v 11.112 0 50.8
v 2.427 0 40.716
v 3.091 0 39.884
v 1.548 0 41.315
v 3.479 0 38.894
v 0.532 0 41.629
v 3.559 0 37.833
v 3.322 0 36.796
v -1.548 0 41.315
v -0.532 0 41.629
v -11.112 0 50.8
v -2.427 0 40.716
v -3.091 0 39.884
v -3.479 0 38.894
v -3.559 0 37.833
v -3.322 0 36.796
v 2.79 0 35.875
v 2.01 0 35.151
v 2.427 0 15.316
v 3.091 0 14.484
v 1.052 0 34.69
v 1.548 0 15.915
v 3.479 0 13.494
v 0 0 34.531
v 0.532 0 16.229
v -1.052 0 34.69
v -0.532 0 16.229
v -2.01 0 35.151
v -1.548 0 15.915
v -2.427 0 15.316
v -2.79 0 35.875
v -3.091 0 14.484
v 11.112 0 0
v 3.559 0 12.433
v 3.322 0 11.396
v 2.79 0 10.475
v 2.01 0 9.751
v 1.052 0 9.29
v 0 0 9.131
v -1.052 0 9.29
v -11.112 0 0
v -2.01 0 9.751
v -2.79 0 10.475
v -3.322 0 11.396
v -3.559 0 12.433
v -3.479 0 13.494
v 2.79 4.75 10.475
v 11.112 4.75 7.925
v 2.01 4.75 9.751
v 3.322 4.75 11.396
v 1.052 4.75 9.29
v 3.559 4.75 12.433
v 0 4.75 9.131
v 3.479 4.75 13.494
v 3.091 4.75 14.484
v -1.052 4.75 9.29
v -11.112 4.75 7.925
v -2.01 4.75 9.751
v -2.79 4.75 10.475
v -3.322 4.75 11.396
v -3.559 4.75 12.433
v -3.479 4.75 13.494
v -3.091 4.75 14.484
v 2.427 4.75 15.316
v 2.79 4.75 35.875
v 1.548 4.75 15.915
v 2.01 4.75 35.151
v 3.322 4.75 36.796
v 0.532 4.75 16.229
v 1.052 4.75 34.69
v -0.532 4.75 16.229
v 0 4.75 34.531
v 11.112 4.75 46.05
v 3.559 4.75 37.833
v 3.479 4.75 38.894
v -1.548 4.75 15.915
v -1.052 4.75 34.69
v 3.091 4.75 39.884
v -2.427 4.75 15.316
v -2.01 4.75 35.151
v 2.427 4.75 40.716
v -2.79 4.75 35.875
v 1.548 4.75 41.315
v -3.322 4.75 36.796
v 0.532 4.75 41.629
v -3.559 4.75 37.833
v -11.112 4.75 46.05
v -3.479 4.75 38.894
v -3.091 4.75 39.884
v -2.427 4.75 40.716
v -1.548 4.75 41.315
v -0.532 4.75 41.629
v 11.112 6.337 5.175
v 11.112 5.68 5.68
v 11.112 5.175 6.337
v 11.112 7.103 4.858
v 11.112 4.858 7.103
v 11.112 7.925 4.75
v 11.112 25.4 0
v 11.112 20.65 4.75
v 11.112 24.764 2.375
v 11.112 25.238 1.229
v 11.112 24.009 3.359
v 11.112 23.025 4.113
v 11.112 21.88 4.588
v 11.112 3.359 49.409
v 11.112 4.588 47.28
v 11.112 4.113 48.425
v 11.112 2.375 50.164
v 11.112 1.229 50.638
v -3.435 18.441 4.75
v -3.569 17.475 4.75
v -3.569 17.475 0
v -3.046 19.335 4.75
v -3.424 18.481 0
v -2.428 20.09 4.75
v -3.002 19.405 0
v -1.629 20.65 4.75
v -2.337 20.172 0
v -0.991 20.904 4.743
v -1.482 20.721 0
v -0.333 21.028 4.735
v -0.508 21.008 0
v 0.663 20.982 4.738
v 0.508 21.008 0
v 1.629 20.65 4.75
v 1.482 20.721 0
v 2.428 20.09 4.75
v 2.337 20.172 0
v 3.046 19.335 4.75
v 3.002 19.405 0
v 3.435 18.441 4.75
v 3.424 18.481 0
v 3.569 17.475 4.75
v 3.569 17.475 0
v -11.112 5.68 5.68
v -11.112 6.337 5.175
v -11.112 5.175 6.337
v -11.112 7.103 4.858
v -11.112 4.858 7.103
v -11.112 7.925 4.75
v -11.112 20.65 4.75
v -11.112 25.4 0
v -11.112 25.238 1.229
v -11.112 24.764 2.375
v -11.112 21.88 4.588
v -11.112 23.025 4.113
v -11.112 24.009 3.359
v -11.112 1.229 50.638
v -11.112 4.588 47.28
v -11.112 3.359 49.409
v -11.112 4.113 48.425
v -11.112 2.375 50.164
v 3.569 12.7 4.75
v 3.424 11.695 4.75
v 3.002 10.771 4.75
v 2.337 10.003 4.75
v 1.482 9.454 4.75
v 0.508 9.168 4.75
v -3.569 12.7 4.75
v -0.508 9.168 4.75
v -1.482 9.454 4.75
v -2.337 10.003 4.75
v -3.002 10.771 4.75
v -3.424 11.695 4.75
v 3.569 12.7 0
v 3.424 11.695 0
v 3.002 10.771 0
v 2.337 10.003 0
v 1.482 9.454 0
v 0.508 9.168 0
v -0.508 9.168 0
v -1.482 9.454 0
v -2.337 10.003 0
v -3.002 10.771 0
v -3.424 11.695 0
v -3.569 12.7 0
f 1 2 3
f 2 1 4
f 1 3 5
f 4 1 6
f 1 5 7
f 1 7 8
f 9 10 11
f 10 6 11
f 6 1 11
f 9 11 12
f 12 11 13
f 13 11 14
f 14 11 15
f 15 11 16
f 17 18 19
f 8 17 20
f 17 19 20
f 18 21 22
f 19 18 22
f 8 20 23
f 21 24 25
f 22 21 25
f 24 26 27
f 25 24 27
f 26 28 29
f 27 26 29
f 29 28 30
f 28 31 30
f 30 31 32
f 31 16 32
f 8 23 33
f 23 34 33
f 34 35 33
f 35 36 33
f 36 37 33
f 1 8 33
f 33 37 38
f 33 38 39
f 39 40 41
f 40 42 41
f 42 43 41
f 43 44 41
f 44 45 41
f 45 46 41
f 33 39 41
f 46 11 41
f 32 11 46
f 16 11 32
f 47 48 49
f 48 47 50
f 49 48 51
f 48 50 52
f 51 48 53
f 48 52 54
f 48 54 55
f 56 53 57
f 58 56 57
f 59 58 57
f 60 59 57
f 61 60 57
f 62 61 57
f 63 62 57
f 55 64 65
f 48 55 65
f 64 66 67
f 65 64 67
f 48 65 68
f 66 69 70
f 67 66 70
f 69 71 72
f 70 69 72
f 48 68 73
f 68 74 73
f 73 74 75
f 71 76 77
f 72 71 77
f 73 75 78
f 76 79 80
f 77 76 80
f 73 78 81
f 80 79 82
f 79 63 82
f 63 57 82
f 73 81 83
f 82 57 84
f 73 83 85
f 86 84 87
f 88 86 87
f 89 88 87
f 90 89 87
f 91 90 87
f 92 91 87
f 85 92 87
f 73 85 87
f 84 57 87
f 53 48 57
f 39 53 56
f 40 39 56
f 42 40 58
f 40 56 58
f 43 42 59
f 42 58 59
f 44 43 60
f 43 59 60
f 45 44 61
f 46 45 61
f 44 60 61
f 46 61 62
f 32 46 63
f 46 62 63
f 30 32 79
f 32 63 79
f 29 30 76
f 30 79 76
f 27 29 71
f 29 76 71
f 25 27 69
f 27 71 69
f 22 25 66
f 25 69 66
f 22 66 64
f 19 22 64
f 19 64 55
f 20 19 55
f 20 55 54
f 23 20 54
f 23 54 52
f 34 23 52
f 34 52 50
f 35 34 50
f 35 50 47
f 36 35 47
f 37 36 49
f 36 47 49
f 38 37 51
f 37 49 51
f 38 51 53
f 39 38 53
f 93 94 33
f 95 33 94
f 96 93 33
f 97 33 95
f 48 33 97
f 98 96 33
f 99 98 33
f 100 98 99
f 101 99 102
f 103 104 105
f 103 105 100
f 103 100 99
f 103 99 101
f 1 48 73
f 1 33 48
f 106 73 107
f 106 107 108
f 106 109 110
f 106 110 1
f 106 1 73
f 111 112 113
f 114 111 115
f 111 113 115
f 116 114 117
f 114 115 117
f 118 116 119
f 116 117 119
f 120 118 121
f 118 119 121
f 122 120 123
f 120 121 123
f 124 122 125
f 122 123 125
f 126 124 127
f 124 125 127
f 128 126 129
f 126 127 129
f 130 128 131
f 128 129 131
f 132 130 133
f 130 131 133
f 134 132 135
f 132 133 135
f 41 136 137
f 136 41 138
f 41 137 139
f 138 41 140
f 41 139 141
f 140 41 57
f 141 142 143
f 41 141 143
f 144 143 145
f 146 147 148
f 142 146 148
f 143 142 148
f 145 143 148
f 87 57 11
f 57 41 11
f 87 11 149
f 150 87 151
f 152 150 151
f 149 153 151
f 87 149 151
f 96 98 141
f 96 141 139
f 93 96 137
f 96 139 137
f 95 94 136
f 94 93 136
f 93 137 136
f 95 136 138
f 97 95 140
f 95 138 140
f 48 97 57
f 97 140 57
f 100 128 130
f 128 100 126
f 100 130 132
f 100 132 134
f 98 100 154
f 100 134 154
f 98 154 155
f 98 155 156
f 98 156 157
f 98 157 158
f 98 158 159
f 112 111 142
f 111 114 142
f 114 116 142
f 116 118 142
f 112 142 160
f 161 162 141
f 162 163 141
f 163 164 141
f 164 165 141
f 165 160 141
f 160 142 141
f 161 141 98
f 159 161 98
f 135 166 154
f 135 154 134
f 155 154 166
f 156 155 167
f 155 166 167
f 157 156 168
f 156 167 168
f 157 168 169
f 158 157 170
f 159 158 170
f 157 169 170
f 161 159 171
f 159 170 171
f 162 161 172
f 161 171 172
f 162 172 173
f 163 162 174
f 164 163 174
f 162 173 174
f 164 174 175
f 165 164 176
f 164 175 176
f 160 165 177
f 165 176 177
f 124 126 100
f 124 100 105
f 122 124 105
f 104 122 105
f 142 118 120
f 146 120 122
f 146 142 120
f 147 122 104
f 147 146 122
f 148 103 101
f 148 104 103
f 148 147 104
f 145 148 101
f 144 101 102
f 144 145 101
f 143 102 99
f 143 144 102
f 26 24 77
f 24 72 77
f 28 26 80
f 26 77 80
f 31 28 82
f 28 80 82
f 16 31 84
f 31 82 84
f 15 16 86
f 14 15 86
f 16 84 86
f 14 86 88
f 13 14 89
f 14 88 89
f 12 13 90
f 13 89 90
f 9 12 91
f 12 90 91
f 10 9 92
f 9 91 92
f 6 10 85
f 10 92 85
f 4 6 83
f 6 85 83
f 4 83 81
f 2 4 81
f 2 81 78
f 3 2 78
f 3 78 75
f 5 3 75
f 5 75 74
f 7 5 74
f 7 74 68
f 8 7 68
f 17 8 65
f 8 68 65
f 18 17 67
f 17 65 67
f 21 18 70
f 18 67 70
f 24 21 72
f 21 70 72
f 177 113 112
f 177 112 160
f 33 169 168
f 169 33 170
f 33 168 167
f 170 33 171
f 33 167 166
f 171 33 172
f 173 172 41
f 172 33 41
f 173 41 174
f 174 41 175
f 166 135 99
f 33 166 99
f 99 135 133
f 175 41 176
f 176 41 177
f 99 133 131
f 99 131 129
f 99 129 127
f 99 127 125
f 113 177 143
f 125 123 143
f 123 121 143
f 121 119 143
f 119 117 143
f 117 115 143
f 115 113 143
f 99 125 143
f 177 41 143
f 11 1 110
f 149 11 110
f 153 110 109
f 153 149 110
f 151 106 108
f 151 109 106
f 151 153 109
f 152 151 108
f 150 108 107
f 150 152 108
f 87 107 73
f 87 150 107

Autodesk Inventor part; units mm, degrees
ref_plane "YZ Plane" through (0, 0, 0) normal (1, 0, 0) x (0, 1, 0)
ref_plane "XZ Plane" through (0, 0, 0) normal (0, 1, 0) x (-1, 0, 0)
ref_plane "XY Plane" through (0, 0, 0) normal (0, 0, 1) x (1, 0, 0)
sketch "Sketch_1" plane through (0, 0, 0) normal (1, 0, 0) x (0, 1, 0)
  line L0 (0, 50.8) -> (0, 0)
  line L1 (0, 0) -> (25.4, 0)
  arc A0 (25.4, 0) -> (20.6502, 4.7498) centre (20.6502, 0) ccw
  line L2 (20.6502, 4.7498) -> (7.9248, 4.7498)
  arc A1 (4.7498, 7.9248) -> (7.9248, 4.7498) centre (7.9248, 7.9248) ccw
  line L3 (4.7498, 7.9248) -> (4.7498, 46.0502)
  arc A2 (4.7498, 46.0502) -> (0, 50.8) centre (0, 46.0502) ccw
extrude "Extrusion1" add sketch "Sketch_1" along normal mid plane 22.225
sketch "Sketch_2" plane through (0, 0, 0) normal (0, 0, 1) x (1, 0, 0)
  arc A0 (-3.5687, 12.7) -> (3.5687, 12.7) centre (0, 12.7) ccw
  line L0 (3.5687, 12.7) -> (3.5687, 17.4752)
  arc A1 (3.5687, 17.4752) -> (-3.5687, 17.4752) centre (0, 17.4752) ccw
  line L1 (-3.5687, 17.4752) -> (-3.5687, 12.7)
extrude "Extrusion2" cut sketch "Sketch_2" along normal blind 7.9248
sketch "Sketch3" plane through (-11.1125, 0, 50.8) normal (0, -1, 0) x (1, 0, 0)
  point P0 (11.1125, -38.1)
hole "Hole1" at (0, 0, 12.7) direction (0, 1, 0) diameter 7.1374 depth 7.9248
sketch "Sketch4" plane through (-11.1125, 0, 50.8) normal (0, -1, 0) x (1, 0, 0)
  point P0 (11.1125, -12.7)
hole "Hole2" at (0, 0, 38.1) direction (0, 1, 0) diameter 7.1374 depth 7.9248
properties part number "4250"
